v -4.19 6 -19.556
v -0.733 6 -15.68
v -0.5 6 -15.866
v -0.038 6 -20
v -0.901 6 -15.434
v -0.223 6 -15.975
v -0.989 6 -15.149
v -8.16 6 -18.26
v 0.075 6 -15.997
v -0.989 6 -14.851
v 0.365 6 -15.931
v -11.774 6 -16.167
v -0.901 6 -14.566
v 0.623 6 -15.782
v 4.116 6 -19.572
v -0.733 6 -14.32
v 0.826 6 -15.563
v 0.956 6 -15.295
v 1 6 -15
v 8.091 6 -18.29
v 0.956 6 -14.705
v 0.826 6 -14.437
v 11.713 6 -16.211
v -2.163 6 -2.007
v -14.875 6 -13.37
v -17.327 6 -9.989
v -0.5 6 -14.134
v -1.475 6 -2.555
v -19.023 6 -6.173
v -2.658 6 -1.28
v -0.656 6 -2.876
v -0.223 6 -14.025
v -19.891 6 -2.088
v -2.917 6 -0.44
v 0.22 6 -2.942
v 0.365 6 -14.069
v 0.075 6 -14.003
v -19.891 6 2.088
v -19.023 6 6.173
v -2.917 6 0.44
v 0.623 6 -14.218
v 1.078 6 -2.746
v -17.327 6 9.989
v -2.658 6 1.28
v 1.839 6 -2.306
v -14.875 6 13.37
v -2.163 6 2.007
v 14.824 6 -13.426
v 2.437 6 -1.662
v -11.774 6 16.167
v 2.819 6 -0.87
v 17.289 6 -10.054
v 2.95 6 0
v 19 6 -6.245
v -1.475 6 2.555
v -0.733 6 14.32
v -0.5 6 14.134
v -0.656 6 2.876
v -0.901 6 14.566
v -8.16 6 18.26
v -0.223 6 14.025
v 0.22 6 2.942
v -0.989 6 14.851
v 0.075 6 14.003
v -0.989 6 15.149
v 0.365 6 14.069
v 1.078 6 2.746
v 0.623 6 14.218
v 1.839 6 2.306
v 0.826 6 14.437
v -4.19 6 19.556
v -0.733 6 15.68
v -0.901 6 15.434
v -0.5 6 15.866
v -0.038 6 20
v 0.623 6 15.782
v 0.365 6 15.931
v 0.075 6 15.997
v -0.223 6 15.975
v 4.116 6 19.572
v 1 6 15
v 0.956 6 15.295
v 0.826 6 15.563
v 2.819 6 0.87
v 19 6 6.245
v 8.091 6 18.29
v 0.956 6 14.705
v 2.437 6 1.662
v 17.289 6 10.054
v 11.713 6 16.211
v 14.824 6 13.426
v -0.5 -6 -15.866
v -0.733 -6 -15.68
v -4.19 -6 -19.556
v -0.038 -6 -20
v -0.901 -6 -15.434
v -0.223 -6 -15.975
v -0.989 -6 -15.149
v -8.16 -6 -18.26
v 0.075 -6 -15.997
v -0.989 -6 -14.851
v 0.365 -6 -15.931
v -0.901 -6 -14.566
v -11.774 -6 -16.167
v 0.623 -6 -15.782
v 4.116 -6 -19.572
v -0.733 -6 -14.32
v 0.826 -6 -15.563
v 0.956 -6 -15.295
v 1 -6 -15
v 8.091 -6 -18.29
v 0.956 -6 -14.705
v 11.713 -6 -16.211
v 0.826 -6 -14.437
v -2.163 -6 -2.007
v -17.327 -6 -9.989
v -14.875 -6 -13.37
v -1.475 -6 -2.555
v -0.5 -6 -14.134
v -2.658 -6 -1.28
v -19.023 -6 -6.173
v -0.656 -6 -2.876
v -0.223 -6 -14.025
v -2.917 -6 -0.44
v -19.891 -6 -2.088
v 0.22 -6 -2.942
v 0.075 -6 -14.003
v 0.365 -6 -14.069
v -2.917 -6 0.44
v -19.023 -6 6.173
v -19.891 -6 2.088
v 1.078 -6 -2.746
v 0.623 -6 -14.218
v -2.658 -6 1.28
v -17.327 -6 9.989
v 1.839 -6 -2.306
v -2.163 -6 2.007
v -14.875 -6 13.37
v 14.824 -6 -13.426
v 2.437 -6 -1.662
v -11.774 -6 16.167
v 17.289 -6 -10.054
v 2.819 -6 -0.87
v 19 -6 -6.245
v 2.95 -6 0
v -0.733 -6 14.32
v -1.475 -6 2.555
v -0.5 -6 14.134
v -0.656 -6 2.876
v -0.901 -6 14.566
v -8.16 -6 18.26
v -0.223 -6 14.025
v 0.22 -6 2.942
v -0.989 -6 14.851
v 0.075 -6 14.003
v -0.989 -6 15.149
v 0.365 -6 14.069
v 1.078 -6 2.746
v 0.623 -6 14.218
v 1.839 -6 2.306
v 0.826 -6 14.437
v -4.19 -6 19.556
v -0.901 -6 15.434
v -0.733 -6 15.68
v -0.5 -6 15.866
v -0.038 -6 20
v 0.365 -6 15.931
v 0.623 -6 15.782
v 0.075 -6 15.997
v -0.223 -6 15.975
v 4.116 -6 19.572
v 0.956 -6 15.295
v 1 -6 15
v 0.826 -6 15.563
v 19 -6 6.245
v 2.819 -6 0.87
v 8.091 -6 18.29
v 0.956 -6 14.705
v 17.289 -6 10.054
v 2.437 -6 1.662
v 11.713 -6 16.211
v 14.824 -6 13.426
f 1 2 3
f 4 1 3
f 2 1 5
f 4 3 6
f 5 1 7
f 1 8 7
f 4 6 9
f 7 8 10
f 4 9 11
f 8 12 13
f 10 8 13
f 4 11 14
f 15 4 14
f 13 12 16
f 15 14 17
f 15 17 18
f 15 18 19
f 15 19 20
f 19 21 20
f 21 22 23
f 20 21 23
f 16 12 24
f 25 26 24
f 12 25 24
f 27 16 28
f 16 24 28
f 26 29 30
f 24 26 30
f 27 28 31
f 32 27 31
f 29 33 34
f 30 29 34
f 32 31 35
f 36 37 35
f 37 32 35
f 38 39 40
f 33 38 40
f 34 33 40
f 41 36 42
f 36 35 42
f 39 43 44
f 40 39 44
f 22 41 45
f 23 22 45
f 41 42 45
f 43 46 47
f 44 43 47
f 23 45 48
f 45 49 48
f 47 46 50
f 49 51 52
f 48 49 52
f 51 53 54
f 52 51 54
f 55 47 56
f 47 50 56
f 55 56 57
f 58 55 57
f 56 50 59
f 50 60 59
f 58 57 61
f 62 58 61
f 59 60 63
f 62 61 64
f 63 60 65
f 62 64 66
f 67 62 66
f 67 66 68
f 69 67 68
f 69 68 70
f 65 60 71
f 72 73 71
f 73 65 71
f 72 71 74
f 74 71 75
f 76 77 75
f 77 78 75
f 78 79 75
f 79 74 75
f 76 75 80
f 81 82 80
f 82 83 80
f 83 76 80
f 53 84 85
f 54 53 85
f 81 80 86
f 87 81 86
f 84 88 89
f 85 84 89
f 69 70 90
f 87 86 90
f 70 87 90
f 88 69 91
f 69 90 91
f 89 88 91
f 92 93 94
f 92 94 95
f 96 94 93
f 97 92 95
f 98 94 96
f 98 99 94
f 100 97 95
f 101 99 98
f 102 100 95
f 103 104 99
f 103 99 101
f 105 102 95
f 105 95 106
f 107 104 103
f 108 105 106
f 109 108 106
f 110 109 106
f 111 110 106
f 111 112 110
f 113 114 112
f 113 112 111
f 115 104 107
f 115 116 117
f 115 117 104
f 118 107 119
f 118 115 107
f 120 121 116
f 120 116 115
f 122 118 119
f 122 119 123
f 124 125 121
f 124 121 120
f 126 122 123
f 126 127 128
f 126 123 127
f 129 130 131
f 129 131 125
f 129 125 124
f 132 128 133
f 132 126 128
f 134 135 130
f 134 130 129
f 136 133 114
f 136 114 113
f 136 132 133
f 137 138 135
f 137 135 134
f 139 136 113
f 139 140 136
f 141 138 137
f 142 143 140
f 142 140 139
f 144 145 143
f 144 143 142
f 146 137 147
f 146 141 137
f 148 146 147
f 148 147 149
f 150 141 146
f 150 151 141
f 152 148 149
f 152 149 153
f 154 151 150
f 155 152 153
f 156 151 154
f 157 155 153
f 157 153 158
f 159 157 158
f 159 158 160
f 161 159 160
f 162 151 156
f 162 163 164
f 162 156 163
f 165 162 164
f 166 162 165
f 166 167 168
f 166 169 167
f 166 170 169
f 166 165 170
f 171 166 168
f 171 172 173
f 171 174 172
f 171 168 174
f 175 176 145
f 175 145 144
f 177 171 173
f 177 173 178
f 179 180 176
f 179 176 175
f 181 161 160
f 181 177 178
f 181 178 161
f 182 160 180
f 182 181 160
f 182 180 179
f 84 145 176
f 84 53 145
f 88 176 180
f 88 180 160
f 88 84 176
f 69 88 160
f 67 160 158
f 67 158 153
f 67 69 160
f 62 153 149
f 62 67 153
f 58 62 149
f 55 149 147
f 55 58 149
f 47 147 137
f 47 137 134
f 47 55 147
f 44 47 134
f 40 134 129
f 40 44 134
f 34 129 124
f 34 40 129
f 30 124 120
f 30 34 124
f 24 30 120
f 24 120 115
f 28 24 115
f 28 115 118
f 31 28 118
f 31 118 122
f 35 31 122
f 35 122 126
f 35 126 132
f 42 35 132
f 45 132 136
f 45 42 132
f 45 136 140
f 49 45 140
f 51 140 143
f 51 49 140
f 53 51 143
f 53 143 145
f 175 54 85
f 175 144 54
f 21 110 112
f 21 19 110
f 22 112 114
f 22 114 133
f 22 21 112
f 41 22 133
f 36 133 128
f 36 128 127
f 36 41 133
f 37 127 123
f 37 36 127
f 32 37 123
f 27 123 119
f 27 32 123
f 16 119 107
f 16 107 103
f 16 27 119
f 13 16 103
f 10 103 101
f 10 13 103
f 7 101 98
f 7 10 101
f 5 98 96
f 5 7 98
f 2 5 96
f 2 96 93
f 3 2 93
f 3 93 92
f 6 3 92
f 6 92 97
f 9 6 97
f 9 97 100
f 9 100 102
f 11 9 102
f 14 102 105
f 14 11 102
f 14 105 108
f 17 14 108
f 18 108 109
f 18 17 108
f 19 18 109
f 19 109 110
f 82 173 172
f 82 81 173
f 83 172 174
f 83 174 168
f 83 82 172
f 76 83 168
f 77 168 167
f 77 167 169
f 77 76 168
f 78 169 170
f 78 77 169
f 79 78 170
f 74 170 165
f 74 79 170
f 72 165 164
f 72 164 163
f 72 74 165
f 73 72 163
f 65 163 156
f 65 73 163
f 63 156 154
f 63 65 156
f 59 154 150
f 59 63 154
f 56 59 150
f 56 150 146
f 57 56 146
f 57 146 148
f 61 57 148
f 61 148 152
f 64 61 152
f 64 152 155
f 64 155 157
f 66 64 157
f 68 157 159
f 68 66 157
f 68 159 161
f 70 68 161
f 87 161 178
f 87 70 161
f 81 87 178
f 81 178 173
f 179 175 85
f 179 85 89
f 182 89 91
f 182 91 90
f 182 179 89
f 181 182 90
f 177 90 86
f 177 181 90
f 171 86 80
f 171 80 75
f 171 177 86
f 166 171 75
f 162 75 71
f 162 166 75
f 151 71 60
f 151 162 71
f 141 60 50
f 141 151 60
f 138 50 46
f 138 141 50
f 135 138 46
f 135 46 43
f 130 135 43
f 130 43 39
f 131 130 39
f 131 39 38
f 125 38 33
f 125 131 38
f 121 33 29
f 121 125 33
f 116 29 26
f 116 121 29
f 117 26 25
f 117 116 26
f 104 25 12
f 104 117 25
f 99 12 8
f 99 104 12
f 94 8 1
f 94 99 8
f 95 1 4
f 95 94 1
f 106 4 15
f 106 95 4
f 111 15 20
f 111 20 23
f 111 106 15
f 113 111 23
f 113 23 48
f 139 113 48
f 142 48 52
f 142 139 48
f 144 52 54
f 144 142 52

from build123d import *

# Parameters (mm, degrees)
F0_R     = 1
F0_R_2   = 2.95
F1_DEPTH = 6


with BuildPart() as f1:
    # F0 (on Front) → F1 (new body, symmetric)
    with BuildSketch(Plane.XZ):
        with BuildLine():
            Line((19, -6.244998), (19, 6.244998))
            ThreePointArc((19, 6.244998), (-20, 0), (19, -6.244998))
        make_face()
        with Locations((0, -15)):
            Circle(F0_R, mode=Mode.SUBTRACT)
        Circle(F0_R_2, mode=Mode.SUBTRACT)
        with Locations((0, 15)):
            Circle(F0_R, mode=Mode.SUBTRACT)
    extrude(amount=F1_DEPTH, both=True)


solid = f1.part
